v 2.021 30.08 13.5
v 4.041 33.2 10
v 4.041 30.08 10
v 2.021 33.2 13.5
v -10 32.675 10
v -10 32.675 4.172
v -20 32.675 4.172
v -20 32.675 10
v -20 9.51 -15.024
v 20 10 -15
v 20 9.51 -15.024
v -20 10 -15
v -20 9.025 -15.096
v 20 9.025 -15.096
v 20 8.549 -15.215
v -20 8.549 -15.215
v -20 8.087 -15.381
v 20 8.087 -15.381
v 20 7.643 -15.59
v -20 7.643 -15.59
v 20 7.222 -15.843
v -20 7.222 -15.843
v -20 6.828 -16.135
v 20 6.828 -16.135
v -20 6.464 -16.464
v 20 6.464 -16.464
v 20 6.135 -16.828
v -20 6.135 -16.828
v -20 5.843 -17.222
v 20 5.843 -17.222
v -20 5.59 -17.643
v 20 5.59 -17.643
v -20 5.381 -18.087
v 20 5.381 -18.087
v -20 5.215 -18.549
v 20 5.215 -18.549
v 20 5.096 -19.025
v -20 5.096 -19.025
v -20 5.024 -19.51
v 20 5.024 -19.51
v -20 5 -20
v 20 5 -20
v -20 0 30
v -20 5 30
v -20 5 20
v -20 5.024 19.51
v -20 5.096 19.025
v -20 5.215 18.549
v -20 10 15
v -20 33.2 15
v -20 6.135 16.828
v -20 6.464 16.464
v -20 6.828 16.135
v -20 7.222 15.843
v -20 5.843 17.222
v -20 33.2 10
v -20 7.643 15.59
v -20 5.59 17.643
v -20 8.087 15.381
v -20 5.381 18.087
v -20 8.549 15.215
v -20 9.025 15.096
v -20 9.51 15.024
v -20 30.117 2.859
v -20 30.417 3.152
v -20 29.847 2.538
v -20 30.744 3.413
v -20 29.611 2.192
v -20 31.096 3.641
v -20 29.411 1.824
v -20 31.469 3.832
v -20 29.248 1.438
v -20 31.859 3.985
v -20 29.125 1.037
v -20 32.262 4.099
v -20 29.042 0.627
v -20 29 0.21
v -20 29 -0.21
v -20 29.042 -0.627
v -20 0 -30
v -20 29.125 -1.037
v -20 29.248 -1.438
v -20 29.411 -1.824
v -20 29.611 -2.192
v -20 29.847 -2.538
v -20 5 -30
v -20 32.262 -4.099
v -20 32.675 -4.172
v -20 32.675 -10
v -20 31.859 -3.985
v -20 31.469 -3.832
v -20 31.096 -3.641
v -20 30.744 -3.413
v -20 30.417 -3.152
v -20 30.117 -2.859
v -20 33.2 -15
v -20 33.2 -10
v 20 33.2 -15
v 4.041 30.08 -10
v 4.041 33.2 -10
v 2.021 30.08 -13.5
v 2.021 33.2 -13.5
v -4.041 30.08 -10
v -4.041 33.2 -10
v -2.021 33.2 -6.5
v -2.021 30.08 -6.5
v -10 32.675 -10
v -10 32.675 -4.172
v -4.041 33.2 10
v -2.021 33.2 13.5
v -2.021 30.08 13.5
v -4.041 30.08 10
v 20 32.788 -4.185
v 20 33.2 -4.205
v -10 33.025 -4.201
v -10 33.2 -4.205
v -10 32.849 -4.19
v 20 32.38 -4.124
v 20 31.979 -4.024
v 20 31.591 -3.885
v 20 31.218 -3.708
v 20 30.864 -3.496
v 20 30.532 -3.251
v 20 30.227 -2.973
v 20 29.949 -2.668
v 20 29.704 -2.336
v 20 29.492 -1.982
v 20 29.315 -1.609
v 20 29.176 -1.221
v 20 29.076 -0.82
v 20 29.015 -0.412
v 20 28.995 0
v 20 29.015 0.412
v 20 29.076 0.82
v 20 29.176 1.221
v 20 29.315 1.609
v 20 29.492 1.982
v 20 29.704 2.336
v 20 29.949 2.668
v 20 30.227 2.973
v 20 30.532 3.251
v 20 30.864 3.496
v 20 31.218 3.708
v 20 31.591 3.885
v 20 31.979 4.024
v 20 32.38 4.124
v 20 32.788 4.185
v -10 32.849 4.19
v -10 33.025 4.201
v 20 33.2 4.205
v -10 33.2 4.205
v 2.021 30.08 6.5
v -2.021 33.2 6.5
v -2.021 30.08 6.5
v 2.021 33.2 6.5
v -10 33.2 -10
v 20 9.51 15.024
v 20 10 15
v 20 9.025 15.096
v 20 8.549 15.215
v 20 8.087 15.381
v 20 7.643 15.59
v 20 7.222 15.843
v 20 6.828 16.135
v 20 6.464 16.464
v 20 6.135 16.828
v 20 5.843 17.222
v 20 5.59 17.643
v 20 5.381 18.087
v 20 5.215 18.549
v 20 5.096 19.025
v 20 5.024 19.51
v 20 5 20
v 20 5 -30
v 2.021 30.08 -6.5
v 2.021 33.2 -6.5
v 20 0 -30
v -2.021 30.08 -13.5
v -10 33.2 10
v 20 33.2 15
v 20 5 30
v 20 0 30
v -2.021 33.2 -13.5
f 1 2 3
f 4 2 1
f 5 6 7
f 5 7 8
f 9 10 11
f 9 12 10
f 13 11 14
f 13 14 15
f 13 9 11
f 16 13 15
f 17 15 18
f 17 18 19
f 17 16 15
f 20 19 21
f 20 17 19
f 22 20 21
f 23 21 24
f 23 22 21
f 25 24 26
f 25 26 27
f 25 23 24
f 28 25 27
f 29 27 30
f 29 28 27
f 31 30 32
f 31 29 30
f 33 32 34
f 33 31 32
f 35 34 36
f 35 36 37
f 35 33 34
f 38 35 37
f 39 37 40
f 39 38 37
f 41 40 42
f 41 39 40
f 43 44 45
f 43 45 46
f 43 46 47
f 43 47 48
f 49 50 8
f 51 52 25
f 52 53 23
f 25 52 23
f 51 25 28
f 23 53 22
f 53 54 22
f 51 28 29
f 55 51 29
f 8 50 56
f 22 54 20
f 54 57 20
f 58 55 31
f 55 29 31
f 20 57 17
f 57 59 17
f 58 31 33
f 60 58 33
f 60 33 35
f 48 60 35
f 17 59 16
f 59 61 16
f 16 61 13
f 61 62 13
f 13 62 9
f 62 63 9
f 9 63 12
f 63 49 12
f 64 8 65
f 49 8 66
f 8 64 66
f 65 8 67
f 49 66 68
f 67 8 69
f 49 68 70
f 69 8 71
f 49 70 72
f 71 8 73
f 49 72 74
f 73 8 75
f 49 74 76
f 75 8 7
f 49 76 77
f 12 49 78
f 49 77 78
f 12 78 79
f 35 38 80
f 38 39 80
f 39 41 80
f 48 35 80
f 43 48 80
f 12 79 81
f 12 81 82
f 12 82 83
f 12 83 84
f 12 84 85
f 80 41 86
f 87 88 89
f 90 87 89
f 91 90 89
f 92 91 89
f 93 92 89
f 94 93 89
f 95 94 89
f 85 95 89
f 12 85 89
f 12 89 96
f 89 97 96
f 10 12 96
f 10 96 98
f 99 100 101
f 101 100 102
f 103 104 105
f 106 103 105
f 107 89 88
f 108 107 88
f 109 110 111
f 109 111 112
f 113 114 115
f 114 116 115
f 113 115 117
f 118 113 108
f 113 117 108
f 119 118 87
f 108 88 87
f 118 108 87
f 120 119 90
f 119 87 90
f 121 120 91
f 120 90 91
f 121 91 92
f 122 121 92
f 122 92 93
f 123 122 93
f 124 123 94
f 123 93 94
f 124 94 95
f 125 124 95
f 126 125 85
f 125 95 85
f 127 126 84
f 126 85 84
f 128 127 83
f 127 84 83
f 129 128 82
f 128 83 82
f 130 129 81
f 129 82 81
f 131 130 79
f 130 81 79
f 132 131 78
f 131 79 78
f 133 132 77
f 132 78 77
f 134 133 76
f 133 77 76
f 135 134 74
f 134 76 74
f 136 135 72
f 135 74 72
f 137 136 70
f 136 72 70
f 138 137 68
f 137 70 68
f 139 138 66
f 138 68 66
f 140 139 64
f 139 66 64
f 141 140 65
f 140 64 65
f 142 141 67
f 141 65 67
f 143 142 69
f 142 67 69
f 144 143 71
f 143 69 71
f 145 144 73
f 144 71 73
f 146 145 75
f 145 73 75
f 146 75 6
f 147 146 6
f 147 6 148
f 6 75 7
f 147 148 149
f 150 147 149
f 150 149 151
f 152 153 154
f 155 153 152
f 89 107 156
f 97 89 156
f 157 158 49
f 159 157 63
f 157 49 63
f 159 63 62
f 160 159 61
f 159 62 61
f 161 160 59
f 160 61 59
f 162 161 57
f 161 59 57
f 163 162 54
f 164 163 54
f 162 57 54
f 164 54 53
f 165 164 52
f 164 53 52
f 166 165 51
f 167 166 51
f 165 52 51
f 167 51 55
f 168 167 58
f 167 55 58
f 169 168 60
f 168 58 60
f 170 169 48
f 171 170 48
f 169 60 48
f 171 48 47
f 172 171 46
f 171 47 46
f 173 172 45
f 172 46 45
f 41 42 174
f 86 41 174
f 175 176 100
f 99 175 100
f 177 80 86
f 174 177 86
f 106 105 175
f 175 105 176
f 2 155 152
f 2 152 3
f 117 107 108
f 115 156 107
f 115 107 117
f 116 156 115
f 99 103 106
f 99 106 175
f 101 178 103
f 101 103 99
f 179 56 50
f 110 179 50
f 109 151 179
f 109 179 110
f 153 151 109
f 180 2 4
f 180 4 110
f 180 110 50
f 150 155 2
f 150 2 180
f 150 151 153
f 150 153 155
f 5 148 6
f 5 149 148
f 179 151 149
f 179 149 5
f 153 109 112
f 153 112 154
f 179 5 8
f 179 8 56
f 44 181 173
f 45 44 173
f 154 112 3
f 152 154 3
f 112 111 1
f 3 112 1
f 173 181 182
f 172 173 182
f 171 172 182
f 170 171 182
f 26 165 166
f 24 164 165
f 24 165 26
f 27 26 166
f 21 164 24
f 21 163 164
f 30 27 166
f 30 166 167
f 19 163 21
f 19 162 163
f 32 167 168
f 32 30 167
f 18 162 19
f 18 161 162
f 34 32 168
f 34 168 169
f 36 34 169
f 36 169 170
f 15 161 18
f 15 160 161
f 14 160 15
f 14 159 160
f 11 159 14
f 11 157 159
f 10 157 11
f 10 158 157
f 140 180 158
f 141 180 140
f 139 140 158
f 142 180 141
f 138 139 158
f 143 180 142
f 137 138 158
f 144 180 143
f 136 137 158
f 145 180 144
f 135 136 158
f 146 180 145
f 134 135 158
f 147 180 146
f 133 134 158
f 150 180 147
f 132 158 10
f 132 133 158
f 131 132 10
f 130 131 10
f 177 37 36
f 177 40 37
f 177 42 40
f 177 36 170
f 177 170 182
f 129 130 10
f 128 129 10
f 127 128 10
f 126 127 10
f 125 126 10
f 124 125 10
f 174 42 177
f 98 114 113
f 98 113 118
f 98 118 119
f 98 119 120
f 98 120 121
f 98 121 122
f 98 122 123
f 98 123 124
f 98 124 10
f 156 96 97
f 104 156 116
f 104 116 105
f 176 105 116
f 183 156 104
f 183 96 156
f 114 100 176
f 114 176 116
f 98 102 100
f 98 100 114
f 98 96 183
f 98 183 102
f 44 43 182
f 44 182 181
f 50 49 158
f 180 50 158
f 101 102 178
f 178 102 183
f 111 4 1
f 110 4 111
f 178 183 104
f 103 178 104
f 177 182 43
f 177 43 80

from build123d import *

# Parameters (mm, degrees)
SKETCH1_W           = 40
SKETCH1_H           = 30
BOSS_EXTRUDE1_DEPTH = 33.2
SKETCH2_R           = 4.205
CUT_EXTRUDE1_DEPTH  = 55.103973976
CUT_EXTRUDE2_DEPTH  = 3.12
SKETCH4_W           = 60
SKETCH4_H           = 5
BOSS_EXTRUDE2_DEPTH = 40
FILLET1_R           = 5
SKETCH5_W           = 20
SKETCH5_H           = 1.05
CUT_EXTRUDE3_DEPTH  = 10


with BuildPart() as part:
    # Sketch1 → Boss-Extrude1 (new body)
    with BuildSketch(Plane(origin=(0, 0, 0), x_dir=(1, 0, 0), z_dir=(0, 1, 0))):
        Rectangle(SKETCH1_W, SKETCH1_H)
    extrude(amount=BOSS_EXTRUDE1_DEPTH)

    # Sketch2 → Cut-Extrude1 (cut, through all)
    with BuildSketch(Plane.ZY.offset(20)):
        with Locations((0, 33.2)):
            Circle(SKETCH2_R)
    extrude(amount=-CUT_EXTRUDE1_DEPTH, mode=Mode.SUBTRACT)

    # Sketch3 → Cut-Extrude2 (cut)
    with BuildSketch(Plane(origin=(0, 33.2, 0), x_dir=(1, 0, 0), z_dir=(0, 1, 0))):
        Polygon((2.020725942, 6.5), (4.041451884, 10), (2.020725942, 13.5), (-2.020725942, 13.5), (-4.041451884, 10), (-2.020725942, 6.5), align=None)
    cut_extrude2 = extrude(amount=-CUT_EXTRUDE2_DEPTH, mode=Mode.SUBTRACT)

    # Mirror1: Cut-Extrude2 across plane
    add(cut_extrude2.mirror(Plane.XY), mode=Mode.SUBTRACT)

    # Sketch4 → Boss-Extrude2 (add)
    with BuildSketch(Plane(origin=(20, 0, 0), x_dir=(0, 0, -1), z_dir=(1, 0, 0))):
        with Locations((0, 2.5)):
            Rectangle(SKETCH4_W, SKETCH4_H)
    extrude(amount=-BOSS_EXTRUDE2_DEPTH)

    # Fillet1
    fillet1_edges = [part.edges().sort_by_distance(p)[0] for p in [
        (0, 5, -15),
        (0, 5, 15),
    ]]
    fillet(fillet1_edges, radius=FILLET1_R)

    # Sketch5 → Cut-Extrude3 (cut)
    with BuildSketch(Plane.ZY.offset(20)):
        with Locations((0, 33.2)):
            Rectangle(SKETCH5_W, SKETCH5_H)
    extrude(amount=-CUT_EXTRUDE3_DEPTH, mode=Mode.SUBTRACT)


solid = part.part
